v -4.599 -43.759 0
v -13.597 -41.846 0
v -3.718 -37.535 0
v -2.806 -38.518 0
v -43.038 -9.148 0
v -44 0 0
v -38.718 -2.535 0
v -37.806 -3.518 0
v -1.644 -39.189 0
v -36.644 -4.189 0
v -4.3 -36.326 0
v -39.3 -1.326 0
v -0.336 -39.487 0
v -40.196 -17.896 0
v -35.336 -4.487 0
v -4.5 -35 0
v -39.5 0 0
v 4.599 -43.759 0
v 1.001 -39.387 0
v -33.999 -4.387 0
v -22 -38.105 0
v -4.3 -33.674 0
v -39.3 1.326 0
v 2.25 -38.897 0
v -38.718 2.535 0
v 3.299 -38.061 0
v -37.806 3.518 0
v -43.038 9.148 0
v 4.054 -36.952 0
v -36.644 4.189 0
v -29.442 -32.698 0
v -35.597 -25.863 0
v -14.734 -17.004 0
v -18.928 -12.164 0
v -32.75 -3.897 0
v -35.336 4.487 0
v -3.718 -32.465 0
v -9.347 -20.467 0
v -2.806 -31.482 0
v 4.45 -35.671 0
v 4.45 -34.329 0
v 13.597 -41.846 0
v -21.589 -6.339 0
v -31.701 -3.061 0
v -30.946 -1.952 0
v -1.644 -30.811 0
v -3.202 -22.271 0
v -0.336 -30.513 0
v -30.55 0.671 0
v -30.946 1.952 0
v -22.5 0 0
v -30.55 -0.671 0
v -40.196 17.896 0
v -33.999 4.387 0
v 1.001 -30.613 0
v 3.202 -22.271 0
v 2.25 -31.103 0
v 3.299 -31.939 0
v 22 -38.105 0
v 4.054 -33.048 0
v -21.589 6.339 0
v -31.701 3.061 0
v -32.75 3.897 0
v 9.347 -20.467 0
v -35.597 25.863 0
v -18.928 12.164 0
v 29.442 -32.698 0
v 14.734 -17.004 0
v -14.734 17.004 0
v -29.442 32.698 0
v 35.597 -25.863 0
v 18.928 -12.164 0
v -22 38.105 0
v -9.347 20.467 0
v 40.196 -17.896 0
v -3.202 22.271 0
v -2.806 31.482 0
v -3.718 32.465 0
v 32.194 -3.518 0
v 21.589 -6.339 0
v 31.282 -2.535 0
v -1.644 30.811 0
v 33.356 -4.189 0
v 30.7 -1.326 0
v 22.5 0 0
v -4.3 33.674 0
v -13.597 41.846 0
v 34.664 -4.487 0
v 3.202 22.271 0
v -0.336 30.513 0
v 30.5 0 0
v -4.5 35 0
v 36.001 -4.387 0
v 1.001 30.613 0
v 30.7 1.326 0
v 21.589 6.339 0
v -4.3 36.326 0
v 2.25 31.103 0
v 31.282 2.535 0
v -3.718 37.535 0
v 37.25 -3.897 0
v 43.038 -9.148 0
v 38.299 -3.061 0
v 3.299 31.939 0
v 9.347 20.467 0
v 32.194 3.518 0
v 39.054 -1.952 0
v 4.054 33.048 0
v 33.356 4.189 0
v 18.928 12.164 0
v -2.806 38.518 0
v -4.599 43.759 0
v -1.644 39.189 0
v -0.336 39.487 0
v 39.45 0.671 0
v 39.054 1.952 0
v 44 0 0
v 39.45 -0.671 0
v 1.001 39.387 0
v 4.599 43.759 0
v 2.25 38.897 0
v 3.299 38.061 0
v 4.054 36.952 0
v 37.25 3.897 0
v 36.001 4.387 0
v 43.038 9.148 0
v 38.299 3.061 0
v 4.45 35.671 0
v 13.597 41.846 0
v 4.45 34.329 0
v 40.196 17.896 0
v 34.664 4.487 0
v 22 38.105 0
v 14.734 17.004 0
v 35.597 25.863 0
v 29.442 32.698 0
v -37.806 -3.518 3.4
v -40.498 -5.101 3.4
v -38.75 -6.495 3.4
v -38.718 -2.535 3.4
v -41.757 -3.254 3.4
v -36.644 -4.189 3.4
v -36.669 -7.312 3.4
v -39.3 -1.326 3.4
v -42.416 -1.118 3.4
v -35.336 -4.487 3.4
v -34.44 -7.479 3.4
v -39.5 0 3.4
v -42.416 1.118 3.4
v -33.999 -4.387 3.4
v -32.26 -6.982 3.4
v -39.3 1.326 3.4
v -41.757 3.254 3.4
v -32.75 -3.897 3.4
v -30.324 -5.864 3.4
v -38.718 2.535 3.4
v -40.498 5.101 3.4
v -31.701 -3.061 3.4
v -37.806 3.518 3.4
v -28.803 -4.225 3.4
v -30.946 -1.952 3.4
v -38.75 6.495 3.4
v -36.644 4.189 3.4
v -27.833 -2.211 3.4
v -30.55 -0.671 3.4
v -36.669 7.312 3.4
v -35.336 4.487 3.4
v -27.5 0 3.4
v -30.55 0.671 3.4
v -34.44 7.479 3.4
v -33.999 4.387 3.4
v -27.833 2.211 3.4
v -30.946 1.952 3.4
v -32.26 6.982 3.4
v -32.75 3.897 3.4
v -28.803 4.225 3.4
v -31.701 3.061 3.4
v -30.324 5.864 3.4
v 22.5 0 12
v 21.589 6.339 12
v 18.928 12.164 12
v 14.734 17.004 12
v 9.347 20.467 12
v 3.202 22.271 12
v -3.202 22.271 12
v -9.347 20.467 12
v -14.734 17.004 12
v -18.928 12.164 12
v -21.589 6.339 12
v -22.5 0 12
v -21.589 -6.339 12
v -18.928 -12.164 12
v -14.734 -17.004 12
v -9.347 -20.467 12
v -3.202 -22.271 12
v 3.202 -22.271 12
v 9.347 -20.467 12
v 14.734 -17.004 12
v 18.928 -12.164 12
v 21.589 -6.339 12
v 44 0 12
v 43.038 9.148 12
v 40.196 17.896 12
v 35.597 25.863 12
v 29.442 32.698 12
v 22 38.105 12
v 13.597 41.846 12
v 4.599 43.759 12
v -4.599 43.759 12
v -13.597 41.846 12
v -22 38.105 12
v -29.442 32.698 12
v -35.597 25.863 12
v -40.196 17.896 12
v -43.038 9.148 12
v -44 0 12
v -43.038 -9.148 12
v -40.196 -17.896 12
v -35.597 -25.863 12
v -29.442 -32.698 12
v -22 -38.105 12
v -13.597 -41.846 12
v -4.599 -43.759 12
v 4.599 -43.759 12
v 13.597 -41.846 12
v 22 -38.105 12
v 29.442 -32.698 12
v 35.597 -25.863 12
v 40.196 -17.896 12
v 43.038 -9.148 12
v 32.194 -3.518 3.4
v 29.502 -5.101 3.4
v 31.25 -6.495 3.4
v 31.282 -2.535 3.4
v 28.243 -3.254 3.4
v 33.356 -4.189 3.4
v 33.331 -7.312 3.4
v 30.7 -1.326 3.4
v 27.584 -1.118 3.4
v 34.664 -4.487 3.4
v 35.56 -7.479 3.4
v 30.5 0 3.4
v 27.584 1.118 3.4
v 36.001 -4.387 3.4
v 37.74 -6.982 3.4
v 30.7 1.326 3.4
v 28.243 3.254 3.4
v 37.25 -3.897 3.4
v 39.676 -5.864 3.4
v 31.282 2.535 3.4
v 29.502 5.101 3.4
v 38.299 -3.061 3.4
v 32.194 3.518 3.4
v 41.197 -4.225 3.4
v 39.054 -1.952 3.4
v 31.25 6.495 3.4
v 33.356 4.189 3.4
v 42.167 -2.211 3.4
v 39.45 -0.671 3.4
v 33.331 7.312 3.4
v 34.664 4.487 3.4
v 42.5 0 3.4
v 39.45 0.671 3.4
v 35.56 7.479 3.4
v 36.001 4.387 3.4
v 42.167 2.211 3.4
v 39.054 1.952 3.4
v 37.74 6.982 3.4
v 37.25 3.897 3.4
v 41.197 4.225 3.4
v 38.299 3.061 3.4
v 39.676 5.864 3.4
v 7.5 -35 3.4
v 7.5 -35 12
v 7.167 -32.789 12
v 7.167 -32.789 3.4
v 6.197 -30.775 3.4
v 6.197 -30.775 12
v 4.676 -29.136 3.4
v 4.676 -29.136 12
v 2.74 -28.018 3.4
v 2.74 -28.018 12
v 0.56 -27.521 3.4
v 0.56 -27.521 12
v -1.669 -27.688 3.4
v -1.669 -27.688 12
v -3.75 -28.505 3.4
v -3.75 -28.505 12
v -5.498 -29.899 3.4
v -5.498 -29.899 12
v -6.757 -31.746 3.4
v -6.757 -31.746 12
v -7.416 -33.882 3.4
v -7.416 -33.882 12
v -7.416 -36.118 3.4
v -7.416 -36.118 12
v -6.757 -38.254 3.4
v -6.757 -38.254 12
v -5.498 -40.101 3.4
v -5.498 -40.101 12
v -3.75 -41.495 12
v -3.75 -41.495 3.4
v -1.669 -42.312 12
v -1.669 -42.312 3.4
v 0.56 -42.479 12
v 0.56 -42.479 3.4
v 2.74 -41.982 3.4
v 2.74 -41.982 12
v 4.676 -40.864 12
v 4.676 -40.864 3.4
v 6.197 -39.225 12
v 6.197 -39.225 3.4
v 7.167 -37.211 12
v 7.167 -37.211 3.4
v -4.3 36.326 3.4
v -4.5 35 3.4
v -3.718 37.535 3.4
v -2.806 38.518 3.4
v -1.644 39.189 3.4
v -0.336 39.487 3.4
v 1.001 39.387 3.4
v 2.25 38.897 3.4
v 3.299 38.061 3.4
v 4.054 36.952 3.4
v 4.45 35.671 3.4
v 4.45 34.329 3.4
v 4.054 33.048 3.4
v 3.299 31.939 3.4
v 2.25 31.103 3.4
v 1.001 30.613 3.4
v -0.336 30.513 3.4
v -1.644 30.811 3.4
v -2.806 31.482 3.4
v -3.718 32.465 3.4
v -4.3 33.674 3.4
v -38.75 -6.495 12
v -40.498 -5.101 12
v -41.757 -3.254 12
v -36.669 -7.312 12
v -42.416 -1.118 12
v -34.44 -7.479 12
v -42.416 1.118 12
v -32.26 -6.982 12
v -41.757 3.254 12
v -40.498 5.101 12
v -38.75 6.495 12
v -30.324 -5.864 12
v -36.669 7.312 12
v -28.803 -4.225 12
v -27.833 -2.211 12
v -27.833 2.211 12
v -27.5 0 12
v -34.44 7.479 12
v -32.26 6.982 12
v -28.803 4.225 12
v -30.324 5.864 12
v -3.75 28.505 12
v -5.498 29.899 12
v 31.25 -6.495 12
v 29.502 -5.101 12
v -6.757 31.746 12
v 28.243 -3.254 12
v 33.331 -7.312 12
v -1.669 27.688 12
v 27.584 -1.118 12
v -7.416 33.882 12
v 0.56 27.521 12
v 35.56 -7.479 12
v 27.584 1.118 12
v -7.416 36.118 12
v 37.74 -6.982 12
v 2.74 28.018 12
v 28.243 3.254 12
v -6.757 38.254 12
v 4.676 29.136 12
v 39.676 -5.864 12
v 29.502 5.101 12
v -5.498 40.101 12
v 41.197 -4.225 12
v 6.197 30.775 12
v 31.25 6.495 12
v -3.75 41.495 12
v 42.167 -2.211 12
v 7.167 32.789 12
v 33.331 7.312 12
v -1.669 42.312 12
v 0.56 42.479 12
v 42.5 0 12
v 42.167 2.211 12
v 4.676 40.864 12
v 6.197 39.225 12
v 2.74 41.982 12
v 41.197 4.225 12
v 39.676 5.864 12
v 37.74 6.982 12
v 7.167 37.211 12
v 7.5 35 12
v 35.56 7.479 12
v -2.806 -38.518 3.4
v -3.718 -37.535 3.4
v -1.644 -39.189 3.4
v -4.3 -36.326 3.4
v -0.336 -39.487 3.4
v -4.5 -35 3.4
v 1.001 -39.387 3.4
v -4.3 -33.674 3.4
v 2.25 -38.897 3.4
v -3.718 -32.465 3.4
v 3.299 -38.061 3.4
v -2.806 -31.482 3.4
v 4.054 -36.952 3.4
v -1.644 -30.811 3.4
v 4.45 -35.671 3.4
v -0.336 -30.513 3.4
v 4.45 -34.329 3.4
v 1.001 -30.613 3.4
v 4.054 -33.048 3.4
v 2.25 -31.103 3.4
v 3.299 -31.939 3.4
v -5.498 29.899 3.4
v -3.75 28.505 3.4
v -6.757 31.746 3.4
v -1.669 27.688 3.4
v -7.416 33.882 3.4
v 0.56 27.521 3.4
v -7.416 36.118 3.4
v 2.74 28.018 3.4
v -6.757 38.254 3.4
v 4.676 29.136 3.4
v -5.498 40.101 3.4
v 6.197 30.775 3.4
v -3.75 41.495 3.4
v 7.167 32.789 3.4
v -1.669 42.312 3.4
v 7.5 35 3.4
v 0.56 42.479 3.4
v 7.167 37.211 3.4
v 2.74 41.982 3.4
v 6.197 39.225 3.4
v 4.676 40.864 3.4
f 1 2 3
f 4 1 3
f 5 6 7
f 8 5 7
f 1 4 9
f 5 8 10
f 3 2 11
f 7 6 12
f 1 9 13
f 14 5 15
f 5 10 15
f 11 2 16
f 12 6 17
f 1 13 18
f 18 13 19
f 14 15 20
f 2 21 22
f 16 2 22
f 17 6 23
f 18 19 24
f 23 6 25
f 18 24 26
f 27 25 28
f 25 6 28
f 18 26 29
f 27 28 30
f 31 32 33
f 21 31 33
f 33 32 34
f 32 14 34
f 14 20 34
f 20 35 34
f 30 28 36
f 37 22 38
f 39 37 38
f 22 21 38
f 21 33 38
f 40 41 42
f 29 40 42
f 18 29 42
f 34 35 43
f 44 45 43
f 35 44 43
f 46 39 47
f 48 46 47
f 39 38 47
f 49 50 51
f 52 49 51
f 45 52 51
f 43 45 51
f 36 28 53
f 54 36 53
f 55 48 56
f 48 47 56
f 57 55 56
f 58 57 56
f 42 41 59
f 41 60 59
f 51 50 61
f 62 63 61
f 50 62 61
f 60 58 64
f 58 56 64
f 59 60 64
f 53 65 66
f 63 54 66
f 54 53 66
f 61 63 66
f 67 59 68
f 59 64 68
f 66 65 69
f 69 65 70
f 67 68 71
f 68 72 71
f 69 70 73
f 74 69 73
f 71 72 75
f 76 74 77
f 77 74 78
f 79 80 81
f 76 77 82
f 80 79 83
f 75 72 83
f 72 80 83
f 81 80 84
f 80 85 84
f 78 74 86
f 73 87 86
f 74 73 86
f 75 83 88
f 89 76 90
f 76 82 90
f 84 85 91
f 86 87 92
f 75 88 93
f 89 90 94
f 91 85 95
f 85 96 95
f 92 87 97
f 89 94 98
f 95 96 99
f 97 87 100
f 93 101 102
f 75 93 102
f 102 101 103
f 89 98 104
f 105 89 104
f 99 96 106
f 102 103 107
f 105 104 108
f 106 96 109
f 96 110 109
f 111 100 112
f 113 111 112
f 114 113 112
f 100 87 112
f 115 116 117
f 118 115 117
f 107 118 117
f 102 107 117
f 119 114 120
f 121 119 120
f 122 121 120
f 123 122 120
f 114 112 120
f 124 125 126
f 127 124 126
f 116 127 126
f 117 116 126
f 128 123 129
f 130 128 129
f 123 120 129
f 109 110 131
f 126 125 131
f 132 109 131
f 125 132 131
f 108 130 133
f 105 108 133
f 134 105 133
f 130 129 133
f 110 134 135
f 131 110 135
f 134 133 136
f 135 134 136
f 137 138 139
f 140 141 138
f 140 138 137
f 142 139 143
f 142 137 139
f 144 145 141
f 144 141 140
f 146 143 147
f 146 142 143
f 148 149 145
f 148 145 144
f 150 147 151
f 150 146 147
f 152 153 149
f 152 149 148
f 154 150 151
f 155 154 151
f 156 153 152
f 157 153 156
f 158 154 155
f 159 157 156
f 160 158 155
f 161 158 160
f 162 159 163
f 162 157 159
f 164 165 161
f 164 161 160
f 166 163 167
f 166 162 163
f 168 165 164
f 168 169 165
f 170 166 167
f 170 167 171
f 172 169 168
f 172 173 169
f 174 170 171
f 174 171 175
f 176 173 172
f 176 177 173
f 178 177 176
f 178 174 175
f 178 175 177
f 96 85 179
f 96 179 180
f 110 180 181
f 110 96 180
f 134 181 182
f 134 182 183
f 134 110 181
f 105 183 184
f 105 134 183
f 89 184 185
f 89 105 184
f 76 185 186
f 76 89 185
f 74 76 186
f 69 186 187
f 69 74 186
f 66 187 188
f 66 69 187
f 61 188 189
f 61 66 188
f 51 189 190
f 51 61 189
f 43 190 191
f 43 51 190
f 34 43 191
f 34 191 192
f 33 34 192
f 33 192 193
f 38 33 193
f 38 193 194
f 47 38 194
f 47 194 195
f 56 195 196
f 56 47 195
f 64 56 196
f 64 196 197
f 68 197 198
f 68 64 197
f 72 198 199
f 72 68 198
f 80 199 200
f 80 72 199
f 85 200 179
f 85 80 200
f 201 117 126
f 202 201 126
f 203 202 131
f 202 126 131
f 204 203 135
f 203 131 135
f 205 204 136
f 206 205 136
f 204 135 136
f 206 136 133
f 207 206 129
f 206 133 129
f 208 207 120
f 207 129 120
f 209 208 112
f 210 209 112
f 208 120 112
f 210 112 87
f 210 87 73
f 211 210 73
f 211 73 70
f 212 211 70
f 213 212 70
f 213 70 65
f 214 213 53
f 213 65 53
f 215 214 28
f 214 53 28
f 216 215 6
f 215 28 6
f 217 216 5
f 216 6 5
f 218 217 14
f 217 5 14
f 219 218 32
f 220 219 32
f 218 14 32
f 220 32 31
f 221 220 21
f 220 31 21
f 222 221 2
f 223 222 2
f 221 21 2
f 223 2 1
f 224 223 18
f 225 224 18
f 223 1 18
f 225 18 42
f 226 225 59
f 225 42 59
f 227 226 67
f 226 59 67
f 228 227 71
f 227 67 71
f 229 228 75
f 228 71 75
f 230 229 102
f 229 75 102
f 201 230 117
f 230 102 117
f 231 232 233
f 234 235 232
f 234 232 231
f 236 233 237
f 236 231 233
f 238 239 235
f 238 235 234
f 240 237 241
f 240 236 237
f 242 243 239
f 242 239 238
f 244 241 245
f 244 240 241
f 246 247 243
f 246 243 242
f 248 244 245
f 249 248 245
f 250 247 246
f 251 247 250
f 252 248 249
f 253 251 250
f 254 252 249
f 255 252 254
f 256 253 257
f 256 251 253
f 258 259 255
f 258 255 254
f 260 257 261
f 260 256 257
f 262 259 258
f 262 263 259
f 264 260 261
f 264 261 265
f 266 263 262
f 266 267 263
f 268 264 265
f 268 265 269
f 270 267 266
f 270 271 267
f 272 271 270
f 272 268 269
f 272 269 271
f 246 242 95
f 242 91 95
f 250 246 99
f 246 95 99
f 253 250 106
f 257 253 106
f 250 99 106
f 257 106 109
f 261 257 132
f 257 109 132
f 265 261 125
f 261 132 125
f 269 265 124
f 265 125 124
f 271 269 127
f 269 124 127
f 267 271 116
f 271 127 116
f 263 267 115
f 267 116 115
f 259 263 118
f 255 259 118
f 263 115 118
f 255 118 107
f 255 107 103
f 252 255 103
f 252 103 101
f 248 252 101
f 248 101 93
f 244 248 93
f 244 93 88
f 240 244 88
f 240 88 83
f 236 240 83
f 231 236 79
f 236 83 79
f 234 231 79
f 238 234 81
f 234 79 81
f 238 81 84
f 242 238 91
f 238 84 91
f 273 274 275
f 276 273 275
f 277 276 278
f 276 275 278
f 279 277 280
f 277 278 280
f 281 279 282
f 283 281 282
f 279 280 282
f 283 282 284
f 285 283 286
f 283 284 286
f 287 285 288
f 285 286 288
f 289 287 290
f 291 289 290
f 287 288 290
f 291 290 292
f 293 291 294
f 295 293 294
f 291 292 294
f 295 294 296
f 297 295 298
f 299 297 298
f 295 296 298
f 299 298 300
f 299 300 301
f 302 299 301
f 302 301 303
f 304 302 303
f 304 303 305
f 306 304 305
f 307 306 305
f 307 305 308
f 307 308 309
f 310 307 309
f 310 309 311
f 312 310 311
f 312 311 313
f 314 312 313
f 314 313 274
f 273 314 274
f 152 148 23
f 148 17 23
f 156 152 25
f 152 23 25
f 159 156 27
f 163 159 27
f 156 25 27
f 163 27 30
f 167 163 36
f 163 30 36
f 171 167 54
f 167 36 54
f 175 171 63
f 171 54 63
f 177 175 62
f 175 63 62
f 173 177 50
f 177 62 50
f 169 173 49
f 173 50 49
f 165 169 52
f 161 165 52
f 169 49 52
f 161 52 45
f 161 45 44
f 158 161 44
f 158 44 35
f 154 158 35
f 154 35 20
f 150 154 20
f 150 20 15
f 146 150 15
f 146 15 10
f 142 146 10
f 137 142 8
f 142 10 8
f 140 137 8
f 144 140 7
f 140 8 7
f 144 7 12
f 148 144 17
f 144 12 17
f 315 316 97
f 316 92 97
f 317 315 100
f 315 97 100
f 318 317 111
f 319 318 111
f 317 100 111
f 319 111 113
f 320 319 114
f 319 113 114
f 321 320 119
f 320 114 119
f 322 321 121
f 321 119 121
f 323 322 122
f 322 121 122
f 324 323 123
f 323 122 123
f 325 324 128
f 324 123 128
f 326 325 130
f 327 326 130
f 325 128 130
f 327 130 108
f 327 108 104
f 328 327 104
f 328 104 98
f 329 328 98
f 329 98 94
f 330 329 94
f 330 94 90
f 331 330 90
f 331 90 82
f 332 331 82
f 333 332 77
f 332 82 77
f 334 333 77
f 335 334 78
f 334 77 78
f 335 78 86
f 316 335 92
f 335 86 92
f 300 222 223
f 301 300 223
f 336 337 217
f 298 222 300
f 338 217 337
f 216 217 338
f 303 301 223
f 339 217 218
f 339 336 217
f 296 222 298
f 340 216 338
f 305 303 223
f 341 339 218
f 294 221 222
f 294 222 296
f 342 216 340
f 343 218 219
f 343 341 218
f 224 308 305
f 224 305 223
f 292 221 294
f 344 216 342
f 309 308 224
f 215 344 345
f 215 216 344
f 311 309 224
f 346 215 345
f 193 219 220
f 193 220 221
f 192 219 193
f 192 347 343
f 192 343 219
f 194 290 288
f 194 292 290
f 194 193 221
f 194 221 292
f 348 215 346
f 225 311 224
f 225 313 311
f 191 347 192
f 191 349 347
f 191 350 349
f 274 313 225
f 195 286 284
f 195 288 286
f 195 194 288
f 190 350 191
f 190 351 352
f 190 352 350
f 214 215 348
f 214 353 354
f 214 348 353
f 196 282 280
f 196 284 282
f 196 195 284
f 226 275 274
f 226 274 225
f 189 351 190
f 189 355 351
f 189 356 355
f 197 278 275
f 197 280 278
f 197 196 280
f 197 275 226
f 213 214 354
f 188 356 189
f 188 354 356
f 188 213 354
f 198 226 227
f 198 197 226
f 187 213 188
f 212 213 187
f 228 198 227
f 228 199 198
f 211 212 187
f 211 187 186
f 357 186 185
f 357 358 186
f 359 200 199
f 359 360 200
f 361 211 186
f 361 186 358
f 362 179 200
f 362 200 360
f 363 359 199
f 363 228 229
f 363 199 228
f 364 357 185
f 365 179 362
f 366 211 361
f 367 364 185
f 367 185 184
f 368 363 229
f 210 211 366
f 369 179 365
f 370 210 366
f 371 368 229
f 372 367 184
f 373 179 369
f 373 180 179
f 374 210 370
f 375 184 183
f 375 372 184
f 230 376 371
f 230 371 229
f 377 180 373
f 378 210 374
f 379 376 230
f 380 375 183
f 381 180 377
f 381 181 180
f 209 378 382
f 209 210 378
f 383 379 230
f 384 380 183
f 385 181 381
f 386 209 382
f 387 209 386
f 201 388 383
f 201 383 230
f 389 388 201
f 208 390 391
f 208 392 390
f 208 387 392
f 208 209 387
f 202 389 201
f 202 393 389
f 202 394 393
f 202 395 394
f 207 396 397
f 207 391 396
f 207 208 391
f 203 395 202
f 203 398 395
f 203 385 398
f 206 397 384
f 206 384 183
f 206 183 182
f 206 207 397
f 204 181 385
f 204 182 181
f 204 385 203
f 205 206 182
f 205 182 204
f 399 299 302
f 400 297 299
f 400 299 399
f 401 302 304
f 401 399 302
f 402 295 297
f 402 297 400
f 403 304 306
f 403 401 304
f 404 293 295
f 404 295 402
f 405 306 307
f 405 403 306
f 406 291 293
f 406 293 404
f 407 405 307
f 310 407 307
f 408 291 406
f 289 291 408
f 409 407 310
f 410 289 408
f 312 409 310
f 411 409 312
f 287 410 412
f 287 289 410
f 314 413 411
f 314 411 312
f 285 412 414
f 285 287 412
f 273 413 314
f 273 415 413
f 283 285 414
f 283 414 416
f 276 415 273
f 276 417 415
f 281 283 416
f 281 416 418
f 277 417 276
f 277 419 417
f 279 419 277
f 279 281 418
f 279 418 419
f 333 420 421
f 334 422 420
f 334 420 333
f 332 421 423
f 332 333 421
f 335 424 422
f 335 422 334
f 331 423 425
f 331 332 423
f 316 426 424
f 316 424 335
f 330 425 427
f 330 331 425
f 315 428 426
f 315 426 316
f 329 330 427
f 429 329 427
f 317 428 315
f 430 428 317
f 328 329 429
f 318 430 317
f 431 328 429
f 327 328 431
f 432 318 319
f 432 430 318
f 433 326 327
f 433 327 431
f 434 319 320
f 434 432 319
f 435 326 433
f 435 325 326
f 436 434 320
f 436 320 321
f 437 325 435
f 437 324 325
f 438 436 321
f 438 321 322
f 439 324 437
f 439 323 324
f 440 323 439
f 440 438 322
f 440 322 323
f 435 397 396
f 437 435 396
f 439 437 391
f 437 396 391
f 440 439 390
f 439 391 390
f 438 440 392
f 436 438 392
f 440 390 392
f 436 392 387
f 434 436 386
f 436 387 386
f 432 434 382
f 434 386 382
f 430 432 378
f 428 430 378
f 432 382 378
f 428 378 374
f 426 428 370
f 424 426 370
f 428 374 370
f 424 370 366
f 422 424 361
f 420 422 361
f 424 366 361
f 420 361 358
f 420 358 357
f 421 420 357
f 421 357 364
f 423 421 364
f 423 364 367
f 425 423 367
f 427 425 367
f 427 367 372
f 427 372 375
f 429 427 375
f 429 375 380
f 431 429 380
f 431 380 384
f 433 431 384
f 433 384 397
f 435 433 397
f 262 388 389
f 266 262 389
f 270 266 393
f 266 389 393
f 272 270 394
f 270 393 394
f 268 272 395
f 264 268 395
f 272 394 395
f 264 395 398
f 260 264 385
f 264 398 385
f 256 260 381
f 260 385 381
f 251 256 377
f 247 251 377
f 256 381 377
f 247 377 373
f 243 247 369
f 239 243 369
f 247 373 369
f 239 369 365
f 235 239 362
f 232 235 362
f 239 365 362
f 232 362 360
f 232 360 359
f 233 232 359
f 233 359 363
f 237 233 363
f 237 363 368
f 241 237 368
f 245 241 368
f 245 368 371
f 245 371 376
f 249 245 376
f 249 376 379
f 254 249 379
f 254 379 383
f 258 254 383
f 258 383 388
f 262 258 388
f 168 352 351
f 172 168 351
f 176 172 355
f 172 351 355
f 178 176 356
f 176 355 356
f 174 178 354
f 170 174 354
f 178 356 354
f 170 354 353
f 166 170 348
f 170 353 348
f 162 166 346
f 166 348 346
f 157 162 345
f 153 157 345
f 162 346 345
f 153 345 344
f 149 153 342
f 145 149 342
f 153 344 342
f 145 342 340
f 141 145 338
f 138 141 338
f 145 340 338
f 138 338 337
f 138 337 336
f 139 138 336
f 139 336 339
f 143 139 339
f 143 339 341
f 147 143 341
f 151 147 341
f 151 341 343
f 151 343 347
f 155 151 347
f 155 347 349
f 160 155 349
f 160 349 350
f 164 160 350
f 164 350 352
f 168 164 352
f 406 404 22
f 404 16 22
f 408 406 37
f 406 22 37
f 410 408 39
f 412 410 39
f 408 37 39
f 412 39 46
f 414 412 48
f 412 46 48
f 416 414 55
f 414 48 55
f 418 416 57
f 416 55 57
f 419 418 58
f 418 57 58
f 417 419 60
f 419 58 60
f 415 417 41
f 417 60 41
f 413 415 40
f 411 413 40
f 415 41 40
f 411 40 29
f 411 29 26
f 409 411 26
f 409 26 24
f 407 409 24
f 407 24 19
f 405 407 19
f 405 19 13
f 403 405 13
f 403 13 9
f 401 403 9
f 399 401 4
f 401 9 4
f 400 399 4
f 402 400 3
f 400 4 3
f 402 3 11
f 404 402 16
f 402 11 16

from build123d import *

# Parameters (mm, degrees)
IZIM1_R                                           = 44
IZIM1_R_2                                         = 22.5
Y_KSEKLIK_EKSTR_ZYON1_DEPTH                       = 12
M8_ALT_GEN_ALYAN_BA_L_K_R_VIDA_IN_HAV_D           = 9
M8_ALT_GEN_ALYAN_BA_L_K_R_VIDA_IN_HAV_DEPTH       = 22.25
M8_ALT_GEN_ALYAN_BA_L_K_R_VIDA_IN_HAV_CBORE_D     = 15
M8_ALT_GEN_ALYAN_BA_L_K_R_VIDA_IN_HAV_CBORE_DEPTH = 8.6
M8_ALT_GEN_ALYAN_BA_L_K_R_VIDA_IN_HAV_TIP         = 2.703872786


with BuildPart() as part:
    # Çizim1 → Yükseklik-Ekstrüzyon1 (new body)
    with BuildSketch(Plane.XY):
        Circle(IZIM1_R)
        Circle(IZIM1_R_2, mode=Mode.SUBTRACT)
    extrude(amount=Y_KSEKLIK_EKSTR_ZYON1_DEPTH)

    # M8 Altıgen Alyan Başlı Kör Vida İçin Havşa1
    with Locations(Plane.XY.offset(12)):
        with Locations((0, -35), (-35, 0), (0, 35), (35, 0)):
            CounterBoreHole(M8_ALT_GEN_ALYAN_BA_L_K_R_VIDA_IN_HAV_D / 2, M8_ALT_GEN_ALYAN_BA_L_K_R_VIDA_IN_HAV_CBORE_D / 2, M8_ALT_GEN_ALYAN_BA_L_K_R_VIDA_IN_HAV_CBORE_DEPTH, depth=M8_ALT_GEN_ALYAN_BA_L_K_R_VIDA_IN_HAV_DEPTH)
            with Locations((0, 0, -(M8_ALT_GEN_ALYAN_BA_L_K_R_VIDA_IN_HAV_DEPTH + M8_ALT_GEN_ALYAN_BA_L_K_R_VIDA_IN_HAV_TIP / 2))):  # 118° drill point
                Cone(0, M8_ALT_GEN_ALYAN_BA_L_K_R_VIDA_IN_HAV_D / 2, M8_ALT_GEN_ALYAN_BA_L_K_R_VIDA_IN_HAV_TIP, mode=Mode.SUBTRACT)


solid = part.part
